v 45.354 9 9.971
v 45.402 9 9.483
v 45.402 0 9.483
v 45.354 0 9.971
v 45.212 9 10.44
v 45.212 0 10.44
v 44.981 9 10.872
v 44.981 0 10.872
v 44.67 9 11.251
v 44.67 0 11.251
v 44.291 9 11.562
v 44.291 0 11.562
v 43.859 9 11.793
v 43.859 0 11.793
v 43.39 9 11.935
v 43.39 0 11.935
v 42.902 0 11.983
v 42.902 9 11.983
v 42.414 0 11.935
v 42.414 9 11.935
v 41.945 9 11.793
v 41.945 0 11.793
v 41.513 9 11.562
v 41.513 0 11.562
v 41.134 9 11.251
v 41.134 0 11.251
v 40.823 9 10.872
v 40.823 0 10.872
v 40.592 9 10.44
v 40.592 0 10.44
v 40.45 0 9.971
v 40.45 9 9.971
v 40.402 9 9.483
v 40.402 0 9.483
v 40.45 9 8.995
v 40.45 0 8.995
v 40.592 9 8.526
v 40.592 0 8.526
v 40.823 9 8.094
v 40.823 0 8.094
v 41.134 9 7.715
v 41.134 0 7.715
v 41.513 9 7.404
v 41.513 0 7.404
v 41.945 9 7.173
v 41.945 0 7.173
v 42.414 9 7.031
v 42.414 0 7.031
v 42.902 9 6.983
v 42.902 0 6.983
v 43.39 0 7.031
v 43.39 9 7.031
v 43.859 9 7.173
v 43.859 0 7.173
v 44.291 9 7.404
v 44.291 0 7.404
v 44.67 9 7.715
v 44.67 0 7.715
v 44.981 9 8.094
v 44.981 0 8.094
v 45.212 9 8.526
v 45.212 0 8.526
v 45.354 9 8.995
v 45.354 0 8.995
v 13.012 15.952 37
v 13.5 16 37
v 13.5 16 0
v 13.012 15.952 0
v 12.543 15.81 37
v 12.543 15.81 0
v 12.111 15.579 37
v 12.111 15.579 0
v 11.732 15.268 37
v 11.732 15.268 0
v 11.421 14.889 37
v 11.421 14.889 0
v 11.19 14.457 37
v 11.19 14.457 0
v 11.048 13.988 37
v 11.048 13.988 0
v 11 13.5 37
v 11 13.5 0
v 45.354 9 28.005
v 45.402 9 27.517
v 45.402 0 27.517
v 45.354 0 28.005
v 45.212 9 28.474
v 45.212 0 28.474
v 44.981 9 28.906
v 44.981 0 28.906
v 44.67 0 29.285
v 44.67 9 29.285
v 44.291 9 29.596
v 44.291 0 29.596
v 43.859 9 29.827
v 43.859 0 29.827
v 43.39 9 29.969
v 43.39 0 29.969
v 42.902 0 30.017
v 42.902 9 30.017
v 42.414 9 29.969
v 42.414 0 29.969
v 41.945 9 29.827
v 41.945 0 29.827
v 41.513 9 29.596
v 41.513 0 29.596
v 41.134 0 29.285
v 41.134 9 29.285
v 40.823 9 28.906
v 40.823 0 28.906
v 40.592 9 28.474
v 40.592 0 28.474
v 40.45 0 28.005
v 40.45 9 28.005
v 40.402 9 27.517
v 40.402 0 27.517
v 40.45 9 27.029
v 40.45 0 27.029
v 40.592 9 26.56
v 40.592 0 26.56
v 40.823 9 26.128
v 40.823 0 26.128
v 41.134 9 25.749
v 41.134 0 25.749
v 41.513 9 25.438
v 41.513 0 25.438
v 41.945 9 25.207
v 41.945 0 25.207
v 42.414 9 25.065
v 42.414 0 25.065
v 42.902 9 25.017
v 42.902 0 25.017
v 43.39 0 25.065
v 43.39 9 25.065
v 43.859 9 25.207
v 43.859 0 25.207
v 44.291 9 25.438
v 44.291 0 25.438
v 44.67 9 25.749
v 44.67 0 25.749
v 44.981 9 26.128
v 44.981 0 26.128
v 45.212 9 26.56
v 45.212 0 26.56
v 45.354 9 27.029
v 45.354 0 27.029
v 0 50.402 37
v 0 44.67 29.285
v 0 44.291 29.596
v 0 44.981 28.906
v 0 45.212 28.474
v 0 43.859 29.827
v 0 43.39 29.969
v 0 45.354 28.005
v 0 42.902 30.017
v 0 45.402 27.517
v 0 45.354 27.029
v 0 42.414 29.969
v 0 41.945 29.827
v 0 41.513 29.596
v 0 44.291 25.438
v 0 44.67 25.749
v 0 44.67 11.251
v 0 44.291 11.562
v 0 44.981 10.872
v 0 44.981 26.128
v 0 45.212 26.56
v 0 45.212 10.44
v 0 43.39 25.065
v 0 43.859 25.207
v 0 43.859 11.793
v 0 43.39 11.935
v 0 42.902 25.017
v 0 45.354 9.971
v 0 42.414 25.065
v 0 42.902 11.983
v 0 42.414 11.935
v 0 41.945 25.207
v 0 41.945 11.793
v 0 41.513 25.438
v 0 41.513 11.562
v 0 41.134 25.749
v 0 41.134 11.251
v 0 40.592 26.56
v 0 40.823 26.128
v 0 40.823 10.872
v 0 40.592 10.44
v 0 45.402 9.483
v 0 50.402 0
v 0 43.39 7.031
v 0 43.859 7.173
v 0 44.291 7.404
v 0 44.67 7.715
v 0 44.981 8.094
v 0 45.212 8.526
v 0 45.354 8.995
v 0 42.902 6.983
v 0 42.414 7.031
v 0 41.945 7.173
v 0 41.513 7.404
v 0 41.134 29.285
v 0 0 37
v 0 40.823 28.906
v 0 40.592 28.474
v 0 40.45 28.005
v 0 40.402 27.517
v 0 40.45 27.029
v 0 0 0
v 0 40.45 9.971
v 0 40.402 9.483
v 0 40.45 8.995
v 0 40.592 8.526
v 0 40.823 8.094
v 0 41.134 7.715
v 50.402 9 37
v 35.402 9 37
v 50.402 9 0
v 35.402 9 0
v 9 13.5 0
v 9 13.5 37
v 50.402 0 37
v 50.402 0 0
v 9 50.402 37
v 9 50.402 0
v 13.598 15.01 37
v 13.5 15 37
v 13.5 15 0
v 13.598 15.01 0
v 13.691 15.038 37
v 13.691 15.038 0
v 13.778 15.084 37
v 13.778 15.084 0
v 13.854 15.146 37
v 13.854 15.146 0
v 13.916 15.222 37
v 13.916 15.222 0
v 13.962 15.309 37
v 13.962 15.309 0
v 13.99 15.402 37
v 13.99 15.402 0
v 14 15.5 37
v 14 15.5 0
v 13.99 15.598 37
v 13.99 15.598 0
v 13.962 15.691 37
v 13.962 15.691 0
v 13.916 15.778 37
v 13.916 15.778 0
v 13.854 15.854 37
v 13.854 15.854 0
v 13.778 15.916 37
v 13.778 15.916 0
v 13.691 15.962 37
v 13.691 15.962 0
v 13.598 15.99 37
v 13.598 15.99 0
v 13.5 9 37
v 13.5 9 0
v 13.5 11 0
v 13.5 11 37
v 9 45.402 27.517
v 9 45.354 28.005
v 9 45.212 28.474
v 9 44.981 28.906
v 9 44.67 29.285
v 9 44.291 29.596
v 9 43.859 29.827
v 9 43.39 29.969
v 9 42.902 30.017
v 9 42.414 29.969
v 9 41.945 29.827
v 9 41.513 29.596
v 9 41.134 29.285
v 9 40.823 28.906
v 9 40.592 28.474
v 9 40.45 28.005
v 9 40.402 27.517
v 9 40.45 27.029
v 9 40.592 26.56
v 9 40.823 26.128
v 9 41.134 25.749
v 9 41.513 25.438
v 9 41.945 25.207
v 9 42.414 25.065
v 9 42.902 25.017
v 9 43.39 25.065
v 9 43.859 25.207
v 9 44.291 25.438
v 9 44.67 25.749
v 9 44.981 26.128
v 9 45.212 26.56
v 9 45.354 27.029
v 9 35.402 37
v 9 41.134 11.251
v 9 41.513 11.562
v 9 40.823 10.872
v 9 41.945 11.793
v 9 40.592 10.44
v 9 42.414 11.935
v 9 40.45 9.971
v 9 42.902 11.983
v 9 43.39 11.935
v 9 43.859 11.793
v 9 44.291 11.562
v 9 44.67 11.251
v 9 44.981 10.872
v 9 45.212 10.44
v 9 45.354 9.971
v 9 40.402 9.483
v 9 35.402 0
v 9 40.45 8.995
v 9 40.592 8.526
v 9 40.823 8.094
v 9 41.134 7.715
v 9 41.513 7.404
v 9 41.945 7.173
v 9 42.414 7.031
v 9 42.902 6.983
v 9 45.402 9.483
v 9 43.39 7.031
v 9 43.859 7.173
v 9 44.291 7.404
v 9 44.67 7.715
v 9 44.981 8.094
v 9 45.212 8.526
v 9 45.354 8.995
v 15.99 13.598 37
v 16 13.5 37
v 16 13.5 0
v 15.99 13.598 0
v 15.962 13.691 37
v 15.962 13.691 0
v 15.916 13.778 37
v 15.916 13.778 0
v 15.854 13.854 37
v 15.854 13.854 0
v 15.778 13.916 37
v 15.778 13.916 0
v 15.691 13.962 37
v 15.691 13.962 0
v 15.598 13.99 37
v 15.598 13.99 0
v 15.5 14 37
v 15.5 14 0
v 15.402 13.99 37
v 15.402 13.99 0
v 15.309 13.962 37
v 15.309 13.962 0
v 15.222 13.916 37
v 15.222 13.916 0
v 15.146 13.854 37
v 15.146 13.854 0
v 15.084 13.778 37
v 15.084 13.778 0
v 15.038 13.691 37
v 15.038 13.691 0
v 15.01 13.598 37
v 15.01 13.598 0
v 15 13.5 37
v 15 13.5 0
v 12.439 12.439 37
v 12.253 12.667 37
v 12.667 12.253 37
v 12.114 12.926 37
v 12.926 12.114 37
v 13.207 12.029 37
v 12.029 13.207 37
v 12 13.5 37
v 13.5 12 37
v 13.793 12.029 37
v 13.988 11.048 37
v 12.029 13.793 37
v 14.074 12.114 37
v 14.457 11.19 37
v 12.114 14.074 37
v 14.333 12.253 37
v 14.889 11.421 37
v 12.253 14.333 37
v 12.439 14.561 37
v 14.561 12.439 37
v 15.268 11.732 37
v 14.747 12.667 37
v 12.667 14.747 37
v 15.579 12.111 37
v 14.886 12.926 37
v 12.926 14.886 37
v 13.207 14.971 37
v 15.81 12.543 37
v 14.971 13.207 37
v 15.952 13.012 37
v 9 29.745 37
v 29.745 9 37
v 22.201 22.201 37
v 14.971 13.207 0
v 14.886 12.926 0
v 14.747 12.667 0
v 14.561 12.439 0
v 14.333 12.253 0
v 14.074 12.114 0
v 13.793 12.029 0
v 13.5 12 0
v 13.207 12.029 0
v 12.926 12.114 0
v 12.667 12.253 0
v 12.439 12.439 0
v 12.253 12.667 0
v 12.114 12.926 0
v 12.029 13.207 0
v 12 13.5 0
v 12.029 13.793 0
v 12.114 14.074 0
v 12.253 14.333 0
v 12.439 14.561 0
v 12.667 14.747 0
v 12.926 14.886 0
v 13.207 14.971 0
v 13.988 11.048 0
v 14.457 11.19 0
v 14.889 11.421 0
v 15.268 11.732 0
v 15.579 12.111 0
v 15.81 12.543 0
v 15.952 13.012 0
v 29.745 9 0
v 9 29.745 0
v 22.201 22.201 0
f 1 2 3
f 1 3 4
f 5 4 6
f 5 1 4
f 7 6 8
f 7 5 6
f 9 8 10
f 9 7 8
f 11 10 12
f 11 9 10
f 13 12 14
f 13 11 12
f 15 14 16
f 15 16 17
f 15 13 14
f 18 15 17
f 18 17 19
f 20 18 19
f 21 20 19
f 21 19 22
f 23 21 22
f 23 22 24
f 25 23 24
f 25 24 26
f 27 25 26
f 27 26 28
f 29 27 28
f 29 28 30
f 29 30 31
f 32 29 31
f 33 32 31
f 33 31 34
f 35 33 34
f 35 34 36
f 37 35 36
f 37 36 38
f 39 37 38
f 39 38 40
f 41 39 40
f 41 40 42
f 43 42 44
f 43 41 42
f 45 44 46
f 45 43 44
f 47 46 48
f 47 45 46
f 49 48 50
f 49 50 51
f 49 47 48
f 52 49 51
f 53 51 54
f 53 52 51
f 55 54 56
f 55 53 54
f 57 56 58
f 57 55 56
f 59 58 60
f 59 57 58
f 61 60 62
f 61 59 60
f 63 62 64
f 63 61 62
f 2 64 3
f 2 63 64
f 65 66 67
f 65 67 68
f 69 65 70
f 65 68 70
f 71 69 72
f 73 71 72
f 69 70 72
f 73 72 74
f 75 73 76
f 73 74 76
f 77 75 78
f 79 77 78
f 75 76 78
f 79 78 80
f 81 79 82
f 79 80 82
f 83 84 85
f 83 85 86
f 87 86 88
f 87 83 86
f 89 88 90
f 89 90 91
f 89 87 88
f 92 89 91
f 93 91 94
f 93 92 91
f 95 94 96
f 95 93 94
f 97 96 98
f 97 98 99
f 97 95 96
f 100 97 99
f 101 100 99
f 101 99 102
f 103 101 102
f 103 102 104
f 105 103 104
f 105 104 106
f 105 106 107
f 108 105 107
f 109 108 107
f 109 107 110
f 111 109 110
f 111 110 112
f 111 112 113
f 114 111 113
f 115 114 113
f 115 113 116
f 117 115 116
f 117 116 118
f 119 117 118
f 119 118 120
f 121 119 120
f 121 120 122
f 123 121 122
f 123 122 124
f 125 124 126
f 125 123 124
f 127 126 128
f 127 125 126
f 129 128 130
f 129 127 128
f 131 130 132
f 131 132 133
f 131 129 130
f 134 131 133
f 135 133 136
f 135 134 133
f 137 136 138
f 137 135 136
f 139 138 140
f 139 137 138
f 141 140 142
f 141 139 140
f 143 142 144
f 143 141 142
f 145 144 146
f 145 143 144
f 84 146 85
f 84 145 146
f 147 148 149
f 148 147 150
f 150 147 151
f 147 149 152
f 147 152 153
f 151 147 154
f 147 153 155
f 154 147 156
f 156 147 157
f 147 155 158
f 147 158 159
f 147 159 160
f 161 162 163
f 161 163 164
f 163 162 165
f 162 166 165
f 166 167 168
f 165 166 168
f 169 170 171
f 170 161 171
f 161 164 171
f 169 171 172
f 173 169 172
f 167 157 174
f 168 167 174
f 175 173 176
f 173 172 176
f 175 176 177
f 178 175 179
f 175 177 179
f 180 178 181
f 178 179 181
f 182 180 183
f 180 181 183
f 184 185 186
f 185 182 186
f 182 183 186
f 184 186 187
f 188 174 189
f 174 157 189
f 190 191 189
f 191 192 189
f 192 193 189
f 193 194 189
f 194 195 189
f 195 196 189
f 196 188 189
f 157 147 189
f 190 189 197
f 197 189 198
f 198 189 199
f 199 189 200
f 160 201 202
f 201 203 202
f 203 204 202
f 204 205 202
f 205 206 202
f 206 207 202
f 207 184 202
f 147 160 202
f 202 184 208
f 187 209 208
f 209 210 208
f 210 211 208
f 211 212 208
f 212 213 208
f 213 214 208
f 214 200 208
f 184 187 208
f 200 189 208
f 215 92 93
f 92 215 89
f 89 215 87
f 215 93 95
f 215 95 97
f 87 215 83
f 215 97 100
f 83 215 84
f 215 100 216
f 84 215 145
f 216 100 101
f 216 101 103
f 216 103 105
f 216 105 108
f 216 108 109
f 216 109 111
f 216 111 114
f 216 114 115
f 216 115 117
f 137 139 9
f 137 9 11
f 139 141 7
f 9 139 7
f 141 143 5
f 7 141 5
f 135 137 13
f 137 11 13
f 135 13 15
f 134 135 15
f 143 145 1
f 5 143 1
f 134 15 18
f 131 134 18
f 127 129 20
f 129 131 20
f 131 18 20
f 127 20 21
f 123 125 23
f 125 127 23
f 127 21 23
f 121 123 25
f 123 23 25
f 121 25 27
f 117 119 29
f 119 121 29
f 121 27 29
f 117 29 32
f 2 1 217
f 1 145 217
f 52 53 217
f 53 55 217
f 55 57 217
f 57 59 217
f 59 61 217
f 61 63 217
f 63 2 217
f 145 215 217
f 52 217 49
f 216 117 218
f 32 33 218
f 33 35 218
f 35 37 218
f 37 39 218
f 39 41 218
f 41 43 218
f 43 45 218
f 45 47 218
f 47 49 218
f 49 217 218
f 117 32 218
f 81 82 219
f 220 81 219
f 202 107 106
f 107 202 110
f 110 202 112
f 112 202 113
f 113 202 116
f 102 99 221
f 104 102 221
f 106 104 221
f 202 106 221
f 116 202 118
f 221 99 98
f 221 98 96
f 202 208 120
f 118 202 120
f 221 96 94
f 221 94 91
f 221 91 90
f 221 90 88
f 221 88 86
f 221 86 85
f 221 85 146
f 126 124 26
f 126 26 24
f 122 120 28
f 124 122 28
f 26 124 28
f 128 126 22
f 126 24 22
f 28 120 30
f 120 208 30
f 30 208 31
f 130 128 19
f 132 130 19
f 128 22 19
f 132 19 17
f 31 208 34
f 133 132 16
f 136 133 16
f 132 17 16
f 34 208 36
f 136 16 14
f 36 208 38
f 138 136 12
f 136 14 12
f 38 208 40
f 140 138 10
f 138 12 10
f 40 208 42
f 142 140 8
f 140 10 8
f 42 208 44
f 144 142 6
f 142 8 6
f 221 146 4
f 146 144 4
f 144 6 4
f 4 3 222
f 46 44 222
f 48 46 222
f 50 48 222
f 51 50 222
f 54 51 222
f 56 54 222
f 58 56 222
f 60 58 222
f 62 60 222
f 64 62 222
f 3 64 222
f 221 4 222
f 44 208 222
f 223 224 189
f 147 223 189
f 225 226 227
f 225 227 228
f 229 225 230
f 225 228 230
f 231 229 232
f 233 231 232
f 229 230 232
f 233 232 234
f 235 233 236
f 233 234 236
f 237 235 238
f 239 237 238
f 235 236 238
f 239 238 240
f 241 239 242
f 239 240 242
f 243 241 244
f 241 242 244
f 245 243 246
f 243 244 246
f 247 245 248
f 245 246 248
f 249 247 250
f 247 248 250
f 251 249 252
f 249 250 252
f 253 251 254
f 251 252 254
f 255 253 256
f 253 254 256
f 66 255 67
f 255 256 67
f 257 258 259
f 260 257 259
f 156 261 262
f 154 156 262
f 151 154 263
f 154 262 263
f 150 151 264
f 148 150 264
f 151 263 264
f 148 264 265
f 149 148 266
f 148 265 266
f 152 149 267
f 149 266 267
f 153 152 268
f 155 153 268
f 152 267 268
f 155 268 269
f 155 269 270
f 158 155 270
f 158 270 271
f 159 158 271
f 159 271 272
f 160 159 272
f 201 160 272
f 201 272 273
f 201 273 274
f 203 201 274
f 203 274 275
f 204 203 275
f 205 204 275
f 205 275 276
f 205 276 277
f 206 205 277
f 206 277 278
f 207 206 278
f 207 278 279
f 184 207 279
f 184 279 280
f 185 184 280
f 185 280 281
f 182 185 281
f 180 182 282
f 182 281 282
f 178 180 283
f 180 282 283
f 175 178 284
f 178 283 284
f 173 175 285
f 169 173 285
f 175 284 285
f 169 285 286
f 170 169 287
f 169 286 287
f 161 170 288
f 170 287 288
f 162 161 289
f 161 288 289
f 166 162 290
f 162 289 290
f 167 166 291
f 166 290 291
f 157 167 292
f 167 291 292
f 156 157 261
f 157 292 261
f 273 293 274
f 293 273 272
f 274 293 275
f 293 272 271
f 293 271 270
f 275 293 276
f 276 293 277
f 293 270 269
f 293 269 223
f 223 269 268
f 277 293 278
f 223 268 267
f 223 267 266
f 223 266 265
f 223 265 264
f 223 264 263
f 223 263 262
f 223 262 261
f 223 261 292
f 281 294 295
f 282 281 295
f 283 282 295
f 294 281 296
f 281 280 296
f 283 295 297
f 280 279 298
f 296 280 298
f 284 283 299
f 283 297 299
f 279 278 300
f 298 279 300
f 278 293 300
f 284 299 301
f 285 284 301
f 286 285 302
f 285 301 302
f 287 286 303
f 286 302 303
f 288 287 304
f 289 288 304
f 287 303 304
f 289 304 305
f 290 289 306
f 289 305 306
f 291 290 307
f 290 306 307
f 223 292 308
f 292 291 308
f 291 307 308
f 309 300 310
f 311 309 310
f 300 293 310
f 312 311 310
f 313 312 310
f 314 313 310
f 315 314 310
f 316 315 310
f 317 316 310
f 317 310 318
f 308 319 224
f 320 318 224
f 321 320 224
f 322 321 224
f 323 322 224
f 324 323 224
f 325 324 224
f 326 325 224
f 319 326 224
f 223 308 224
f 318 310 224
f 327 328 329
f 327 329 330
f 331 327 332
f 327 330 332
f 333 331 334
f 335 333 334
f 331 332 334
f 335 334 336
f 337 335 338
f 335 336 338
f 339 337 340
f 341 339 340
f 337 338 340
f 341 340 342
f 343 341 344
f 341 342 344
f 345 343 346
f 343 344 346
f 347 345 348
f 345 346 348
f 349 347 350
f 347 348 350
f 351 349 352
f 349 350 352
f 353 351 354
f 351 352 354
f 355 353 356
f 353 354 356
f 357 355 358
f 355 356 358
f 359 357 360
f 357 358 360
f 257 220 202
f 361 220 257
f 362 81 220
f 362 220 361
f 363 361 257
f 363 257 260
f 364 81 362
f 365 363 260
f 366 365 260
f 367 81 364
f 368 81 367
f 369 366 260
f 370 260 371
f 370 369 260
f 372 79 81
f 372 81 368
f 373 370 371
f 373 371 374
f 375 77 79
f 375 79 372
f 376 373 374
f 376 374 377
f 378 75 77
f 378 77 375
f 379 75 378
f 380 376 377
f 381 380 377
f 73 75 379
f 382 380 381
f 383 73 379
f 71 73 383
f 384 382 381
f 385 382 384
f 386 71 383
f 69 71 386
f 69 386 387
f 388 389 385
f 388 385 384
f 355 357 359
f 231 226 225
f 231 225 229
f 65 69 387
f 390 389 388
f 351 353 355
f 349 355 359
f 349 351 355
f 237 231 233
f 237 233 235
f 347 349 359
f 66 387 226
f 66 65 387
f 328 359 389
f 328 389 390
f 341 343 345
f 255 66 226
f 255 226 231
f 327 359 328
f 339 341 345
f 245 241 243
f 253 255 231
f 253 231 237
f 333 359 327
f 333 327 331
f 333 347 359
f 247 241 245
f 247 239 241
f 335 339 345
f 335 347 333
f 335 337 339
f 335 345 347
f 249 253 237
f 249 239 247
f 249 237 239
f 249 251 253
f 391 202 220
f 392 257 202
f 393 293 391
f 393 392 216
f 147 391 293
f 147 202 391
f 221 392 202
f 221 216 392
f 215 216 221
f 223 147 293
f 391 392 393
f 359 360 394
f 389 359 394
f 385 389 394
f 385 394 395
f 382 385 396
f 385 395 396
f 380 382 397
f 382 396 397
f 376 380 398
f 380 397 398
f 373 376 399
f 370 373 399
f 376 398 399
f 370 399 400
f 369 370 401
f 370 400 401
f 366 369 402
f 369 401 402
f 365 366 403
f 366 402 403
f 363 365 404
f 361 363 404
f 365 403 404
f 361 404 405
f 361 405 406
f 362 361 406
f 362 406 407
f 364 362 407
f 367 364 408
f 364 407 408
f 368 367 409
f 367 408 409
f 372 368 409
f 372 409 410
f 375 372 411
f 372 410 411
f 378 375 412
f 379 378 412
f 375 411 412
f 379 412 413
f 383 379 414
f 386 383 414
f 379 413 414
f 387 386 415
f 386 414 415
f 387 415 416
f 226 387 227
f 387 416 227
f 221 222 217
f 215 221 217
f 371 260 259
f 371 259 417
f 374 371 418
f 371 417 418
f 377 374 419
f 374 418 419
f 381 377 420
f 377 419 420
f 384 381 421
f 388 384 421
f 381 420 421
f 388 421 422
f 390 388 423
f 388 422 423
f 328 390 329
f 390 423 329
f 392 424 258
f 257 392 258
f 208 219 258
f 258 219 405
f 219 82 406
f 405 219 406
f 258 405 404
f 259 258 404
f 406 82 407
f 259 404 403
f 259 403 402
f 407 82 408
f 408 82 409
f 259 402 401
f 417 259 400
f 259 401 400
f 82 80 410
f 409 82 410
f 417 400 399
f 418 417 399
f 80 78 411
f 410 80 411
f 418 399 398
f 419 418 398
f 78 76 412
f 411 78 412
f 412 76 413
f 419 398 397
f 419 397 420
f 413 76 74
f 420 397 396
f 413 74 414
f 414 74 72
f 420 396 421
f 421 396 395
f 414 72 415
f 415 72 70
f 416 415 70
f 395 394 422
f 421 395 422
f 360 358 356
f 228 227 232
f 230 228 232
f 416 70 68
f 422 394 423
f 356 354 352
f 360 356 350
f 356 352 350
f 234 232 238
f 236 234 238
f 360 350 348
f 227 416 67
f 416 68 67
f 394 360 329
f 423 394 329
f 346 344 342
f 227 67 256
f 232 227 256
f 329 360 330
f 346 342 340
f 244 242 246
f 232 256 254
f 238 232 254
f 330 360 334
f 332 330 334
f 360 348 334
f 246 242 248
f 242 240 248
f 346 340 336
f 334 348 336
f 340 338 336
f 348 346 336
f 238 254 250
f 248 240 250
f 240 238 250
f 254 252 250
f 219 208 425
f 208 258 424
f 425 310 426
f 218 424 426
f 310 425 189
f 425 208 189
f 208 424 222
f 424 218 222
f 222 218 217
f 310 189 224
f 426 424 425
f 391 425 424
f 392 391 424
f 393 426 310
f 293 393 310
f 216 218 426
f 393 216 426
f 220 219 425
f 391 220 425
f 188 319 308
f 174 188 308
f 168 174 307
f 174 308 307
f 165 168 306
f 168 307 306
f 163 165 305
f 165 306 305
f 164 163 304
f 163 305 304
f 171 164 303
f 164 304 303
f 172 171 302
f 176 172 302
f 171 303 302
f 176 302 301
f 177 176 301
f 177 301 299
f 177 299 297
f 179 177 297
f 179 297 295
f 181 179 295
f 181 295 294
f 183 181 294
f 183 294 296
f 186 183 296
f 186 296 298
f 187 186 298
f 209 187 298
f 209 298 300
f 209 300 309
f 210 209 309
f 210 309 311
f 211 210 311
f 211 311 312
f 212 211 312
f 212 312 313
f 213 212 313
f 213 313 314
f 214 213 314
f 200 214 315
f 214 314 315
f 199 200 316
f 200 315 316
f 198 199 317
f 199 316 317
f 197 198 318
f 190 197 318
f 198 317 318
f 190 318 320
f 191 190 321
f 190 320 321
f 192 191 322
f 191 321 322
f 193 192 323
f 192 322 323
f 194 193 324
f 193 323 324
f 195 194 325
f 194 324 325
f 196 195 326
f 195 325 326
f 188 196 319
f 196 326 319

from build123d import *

# Parameters (mm, degrees)
BOSS_EXTRUDE2_DEPTH = 37
BOSS_EXTRUDE3_DEPTH = 37
CUT_EXTRUDE1_REACH  = 76.99
SKETCH2_R           = 2.5


with BuildPart() as part:
    # Sketch1 → Boss-Extrude2 (new body)
    with BuildSketch(Plane.XY):
        Polygon((35.402000333, 9), (9, 35.402000333), (9, 50.402000333), (0, 50.402000333), (0, 0), (50.402000333, 0), (50.402000333, 9), align=None)
        with BuildLine():
            ThreePointArc((13.5, 11), (11.732233047, 11.732233047), (11, 13.5))
            Line((11, 13.5), (9, 13.5))
            Line((9, 13.5), (9, 29.745146084))
            Line((9, 29.745146084), (29.745146084, 9))
            Line((29.745146084, 9), (13.5, 9))
            Line((13.5, 9), (13.5, 11))
        make_face(mode=Mode.SUBTRACT)
    extrude(amount=BOSS_EXTRUDE2_DEPTH)

    # Sketch1<4> → Boss-Extrude3 (add)
    with BuildSketch(Plane.XY):
        with BuildLine():
            ThreePointArc((13.5, 16), (11.732233047, 11.732233047), (16, 13.5))
            ThreePointArc((16, 13.5), (15.5, 14), (15, 13.5))
            ThreePointArc((15, 13.5), (12.439339828, 12.439339828), (13.5, 15))
            ThreePointArc((13.5, 15), (14, 15.5), (13.5, 16))
        make_face()
    extrude(amount=BOSS_EXTRUDE3_DEPTH)

    # Sketch2 → Cut-Extrude1 (cut, up to next)
    with BuildSketch(Plane(origin=(9, 0, 0), x_dir=(0, 0, -1), z_dir=(1, 0, 0)), mode=Mode.PRIVATE) as cut_extrude1_sk1:
        with Locations((-9.483, 42.902000333)):
            Circle(SKETCH2_R)
    cut_extrude1_tool1 = extrude(cut_extrude1_sk1.sketch, amount=-CUT_EXTRUDE1_REACH, mode=Mode.PRIVATE) & part.part
    # Sketch2 → Cut-Extrude1 (cut, up to next)
    with BuildSketch(Plane(origin=(9, 0, 0), x_dir=(0, 0, -1), z_dir=(1, 0, 0)), mode=Mode.PRIVATE) as cut_extrude1_sk2:
        with Locations((-27.517, 42.902000333)):
            Circle(SKETCH2_R)
    cut_extrude1_tool2 = extrude(cut_extrude1_sk2.sketch, amount=-CUT_EXTRUDE1_REACH, mode=Mode.PRIVATE) & part.part
    cut_extrude1_1 = cut_extrude1_tool1.solids().sort_by_distance((9, 42.902, 9.483))[0]
    add(cut_extrude1_1, mode=Mode.SUBTRACT)
    cut_extrude1_2 = cut_extrude1_tool2.solids().sort_by_distance((9, 42.902, 27.517))[0]
    add(cut_extrude1_2, mode=Mode.SUBTRACT)
    cut_extrude1 = cut_extrude1_1 + cut_extrude1_2  # Cut-Extrude1 as one shape, for the pattern or mirror that repeats it

    # Mirror1: Cut-Extrude1 across plane
    add(cut_extrude1.mirror(Plane(origin=(0, 0, 0), x_dir=(0, 0, 1), z_dir=(0.7071067811865464, -0.7071067811865488, 0))), mode=Mode.SUBTRACT)


solid = part.part
